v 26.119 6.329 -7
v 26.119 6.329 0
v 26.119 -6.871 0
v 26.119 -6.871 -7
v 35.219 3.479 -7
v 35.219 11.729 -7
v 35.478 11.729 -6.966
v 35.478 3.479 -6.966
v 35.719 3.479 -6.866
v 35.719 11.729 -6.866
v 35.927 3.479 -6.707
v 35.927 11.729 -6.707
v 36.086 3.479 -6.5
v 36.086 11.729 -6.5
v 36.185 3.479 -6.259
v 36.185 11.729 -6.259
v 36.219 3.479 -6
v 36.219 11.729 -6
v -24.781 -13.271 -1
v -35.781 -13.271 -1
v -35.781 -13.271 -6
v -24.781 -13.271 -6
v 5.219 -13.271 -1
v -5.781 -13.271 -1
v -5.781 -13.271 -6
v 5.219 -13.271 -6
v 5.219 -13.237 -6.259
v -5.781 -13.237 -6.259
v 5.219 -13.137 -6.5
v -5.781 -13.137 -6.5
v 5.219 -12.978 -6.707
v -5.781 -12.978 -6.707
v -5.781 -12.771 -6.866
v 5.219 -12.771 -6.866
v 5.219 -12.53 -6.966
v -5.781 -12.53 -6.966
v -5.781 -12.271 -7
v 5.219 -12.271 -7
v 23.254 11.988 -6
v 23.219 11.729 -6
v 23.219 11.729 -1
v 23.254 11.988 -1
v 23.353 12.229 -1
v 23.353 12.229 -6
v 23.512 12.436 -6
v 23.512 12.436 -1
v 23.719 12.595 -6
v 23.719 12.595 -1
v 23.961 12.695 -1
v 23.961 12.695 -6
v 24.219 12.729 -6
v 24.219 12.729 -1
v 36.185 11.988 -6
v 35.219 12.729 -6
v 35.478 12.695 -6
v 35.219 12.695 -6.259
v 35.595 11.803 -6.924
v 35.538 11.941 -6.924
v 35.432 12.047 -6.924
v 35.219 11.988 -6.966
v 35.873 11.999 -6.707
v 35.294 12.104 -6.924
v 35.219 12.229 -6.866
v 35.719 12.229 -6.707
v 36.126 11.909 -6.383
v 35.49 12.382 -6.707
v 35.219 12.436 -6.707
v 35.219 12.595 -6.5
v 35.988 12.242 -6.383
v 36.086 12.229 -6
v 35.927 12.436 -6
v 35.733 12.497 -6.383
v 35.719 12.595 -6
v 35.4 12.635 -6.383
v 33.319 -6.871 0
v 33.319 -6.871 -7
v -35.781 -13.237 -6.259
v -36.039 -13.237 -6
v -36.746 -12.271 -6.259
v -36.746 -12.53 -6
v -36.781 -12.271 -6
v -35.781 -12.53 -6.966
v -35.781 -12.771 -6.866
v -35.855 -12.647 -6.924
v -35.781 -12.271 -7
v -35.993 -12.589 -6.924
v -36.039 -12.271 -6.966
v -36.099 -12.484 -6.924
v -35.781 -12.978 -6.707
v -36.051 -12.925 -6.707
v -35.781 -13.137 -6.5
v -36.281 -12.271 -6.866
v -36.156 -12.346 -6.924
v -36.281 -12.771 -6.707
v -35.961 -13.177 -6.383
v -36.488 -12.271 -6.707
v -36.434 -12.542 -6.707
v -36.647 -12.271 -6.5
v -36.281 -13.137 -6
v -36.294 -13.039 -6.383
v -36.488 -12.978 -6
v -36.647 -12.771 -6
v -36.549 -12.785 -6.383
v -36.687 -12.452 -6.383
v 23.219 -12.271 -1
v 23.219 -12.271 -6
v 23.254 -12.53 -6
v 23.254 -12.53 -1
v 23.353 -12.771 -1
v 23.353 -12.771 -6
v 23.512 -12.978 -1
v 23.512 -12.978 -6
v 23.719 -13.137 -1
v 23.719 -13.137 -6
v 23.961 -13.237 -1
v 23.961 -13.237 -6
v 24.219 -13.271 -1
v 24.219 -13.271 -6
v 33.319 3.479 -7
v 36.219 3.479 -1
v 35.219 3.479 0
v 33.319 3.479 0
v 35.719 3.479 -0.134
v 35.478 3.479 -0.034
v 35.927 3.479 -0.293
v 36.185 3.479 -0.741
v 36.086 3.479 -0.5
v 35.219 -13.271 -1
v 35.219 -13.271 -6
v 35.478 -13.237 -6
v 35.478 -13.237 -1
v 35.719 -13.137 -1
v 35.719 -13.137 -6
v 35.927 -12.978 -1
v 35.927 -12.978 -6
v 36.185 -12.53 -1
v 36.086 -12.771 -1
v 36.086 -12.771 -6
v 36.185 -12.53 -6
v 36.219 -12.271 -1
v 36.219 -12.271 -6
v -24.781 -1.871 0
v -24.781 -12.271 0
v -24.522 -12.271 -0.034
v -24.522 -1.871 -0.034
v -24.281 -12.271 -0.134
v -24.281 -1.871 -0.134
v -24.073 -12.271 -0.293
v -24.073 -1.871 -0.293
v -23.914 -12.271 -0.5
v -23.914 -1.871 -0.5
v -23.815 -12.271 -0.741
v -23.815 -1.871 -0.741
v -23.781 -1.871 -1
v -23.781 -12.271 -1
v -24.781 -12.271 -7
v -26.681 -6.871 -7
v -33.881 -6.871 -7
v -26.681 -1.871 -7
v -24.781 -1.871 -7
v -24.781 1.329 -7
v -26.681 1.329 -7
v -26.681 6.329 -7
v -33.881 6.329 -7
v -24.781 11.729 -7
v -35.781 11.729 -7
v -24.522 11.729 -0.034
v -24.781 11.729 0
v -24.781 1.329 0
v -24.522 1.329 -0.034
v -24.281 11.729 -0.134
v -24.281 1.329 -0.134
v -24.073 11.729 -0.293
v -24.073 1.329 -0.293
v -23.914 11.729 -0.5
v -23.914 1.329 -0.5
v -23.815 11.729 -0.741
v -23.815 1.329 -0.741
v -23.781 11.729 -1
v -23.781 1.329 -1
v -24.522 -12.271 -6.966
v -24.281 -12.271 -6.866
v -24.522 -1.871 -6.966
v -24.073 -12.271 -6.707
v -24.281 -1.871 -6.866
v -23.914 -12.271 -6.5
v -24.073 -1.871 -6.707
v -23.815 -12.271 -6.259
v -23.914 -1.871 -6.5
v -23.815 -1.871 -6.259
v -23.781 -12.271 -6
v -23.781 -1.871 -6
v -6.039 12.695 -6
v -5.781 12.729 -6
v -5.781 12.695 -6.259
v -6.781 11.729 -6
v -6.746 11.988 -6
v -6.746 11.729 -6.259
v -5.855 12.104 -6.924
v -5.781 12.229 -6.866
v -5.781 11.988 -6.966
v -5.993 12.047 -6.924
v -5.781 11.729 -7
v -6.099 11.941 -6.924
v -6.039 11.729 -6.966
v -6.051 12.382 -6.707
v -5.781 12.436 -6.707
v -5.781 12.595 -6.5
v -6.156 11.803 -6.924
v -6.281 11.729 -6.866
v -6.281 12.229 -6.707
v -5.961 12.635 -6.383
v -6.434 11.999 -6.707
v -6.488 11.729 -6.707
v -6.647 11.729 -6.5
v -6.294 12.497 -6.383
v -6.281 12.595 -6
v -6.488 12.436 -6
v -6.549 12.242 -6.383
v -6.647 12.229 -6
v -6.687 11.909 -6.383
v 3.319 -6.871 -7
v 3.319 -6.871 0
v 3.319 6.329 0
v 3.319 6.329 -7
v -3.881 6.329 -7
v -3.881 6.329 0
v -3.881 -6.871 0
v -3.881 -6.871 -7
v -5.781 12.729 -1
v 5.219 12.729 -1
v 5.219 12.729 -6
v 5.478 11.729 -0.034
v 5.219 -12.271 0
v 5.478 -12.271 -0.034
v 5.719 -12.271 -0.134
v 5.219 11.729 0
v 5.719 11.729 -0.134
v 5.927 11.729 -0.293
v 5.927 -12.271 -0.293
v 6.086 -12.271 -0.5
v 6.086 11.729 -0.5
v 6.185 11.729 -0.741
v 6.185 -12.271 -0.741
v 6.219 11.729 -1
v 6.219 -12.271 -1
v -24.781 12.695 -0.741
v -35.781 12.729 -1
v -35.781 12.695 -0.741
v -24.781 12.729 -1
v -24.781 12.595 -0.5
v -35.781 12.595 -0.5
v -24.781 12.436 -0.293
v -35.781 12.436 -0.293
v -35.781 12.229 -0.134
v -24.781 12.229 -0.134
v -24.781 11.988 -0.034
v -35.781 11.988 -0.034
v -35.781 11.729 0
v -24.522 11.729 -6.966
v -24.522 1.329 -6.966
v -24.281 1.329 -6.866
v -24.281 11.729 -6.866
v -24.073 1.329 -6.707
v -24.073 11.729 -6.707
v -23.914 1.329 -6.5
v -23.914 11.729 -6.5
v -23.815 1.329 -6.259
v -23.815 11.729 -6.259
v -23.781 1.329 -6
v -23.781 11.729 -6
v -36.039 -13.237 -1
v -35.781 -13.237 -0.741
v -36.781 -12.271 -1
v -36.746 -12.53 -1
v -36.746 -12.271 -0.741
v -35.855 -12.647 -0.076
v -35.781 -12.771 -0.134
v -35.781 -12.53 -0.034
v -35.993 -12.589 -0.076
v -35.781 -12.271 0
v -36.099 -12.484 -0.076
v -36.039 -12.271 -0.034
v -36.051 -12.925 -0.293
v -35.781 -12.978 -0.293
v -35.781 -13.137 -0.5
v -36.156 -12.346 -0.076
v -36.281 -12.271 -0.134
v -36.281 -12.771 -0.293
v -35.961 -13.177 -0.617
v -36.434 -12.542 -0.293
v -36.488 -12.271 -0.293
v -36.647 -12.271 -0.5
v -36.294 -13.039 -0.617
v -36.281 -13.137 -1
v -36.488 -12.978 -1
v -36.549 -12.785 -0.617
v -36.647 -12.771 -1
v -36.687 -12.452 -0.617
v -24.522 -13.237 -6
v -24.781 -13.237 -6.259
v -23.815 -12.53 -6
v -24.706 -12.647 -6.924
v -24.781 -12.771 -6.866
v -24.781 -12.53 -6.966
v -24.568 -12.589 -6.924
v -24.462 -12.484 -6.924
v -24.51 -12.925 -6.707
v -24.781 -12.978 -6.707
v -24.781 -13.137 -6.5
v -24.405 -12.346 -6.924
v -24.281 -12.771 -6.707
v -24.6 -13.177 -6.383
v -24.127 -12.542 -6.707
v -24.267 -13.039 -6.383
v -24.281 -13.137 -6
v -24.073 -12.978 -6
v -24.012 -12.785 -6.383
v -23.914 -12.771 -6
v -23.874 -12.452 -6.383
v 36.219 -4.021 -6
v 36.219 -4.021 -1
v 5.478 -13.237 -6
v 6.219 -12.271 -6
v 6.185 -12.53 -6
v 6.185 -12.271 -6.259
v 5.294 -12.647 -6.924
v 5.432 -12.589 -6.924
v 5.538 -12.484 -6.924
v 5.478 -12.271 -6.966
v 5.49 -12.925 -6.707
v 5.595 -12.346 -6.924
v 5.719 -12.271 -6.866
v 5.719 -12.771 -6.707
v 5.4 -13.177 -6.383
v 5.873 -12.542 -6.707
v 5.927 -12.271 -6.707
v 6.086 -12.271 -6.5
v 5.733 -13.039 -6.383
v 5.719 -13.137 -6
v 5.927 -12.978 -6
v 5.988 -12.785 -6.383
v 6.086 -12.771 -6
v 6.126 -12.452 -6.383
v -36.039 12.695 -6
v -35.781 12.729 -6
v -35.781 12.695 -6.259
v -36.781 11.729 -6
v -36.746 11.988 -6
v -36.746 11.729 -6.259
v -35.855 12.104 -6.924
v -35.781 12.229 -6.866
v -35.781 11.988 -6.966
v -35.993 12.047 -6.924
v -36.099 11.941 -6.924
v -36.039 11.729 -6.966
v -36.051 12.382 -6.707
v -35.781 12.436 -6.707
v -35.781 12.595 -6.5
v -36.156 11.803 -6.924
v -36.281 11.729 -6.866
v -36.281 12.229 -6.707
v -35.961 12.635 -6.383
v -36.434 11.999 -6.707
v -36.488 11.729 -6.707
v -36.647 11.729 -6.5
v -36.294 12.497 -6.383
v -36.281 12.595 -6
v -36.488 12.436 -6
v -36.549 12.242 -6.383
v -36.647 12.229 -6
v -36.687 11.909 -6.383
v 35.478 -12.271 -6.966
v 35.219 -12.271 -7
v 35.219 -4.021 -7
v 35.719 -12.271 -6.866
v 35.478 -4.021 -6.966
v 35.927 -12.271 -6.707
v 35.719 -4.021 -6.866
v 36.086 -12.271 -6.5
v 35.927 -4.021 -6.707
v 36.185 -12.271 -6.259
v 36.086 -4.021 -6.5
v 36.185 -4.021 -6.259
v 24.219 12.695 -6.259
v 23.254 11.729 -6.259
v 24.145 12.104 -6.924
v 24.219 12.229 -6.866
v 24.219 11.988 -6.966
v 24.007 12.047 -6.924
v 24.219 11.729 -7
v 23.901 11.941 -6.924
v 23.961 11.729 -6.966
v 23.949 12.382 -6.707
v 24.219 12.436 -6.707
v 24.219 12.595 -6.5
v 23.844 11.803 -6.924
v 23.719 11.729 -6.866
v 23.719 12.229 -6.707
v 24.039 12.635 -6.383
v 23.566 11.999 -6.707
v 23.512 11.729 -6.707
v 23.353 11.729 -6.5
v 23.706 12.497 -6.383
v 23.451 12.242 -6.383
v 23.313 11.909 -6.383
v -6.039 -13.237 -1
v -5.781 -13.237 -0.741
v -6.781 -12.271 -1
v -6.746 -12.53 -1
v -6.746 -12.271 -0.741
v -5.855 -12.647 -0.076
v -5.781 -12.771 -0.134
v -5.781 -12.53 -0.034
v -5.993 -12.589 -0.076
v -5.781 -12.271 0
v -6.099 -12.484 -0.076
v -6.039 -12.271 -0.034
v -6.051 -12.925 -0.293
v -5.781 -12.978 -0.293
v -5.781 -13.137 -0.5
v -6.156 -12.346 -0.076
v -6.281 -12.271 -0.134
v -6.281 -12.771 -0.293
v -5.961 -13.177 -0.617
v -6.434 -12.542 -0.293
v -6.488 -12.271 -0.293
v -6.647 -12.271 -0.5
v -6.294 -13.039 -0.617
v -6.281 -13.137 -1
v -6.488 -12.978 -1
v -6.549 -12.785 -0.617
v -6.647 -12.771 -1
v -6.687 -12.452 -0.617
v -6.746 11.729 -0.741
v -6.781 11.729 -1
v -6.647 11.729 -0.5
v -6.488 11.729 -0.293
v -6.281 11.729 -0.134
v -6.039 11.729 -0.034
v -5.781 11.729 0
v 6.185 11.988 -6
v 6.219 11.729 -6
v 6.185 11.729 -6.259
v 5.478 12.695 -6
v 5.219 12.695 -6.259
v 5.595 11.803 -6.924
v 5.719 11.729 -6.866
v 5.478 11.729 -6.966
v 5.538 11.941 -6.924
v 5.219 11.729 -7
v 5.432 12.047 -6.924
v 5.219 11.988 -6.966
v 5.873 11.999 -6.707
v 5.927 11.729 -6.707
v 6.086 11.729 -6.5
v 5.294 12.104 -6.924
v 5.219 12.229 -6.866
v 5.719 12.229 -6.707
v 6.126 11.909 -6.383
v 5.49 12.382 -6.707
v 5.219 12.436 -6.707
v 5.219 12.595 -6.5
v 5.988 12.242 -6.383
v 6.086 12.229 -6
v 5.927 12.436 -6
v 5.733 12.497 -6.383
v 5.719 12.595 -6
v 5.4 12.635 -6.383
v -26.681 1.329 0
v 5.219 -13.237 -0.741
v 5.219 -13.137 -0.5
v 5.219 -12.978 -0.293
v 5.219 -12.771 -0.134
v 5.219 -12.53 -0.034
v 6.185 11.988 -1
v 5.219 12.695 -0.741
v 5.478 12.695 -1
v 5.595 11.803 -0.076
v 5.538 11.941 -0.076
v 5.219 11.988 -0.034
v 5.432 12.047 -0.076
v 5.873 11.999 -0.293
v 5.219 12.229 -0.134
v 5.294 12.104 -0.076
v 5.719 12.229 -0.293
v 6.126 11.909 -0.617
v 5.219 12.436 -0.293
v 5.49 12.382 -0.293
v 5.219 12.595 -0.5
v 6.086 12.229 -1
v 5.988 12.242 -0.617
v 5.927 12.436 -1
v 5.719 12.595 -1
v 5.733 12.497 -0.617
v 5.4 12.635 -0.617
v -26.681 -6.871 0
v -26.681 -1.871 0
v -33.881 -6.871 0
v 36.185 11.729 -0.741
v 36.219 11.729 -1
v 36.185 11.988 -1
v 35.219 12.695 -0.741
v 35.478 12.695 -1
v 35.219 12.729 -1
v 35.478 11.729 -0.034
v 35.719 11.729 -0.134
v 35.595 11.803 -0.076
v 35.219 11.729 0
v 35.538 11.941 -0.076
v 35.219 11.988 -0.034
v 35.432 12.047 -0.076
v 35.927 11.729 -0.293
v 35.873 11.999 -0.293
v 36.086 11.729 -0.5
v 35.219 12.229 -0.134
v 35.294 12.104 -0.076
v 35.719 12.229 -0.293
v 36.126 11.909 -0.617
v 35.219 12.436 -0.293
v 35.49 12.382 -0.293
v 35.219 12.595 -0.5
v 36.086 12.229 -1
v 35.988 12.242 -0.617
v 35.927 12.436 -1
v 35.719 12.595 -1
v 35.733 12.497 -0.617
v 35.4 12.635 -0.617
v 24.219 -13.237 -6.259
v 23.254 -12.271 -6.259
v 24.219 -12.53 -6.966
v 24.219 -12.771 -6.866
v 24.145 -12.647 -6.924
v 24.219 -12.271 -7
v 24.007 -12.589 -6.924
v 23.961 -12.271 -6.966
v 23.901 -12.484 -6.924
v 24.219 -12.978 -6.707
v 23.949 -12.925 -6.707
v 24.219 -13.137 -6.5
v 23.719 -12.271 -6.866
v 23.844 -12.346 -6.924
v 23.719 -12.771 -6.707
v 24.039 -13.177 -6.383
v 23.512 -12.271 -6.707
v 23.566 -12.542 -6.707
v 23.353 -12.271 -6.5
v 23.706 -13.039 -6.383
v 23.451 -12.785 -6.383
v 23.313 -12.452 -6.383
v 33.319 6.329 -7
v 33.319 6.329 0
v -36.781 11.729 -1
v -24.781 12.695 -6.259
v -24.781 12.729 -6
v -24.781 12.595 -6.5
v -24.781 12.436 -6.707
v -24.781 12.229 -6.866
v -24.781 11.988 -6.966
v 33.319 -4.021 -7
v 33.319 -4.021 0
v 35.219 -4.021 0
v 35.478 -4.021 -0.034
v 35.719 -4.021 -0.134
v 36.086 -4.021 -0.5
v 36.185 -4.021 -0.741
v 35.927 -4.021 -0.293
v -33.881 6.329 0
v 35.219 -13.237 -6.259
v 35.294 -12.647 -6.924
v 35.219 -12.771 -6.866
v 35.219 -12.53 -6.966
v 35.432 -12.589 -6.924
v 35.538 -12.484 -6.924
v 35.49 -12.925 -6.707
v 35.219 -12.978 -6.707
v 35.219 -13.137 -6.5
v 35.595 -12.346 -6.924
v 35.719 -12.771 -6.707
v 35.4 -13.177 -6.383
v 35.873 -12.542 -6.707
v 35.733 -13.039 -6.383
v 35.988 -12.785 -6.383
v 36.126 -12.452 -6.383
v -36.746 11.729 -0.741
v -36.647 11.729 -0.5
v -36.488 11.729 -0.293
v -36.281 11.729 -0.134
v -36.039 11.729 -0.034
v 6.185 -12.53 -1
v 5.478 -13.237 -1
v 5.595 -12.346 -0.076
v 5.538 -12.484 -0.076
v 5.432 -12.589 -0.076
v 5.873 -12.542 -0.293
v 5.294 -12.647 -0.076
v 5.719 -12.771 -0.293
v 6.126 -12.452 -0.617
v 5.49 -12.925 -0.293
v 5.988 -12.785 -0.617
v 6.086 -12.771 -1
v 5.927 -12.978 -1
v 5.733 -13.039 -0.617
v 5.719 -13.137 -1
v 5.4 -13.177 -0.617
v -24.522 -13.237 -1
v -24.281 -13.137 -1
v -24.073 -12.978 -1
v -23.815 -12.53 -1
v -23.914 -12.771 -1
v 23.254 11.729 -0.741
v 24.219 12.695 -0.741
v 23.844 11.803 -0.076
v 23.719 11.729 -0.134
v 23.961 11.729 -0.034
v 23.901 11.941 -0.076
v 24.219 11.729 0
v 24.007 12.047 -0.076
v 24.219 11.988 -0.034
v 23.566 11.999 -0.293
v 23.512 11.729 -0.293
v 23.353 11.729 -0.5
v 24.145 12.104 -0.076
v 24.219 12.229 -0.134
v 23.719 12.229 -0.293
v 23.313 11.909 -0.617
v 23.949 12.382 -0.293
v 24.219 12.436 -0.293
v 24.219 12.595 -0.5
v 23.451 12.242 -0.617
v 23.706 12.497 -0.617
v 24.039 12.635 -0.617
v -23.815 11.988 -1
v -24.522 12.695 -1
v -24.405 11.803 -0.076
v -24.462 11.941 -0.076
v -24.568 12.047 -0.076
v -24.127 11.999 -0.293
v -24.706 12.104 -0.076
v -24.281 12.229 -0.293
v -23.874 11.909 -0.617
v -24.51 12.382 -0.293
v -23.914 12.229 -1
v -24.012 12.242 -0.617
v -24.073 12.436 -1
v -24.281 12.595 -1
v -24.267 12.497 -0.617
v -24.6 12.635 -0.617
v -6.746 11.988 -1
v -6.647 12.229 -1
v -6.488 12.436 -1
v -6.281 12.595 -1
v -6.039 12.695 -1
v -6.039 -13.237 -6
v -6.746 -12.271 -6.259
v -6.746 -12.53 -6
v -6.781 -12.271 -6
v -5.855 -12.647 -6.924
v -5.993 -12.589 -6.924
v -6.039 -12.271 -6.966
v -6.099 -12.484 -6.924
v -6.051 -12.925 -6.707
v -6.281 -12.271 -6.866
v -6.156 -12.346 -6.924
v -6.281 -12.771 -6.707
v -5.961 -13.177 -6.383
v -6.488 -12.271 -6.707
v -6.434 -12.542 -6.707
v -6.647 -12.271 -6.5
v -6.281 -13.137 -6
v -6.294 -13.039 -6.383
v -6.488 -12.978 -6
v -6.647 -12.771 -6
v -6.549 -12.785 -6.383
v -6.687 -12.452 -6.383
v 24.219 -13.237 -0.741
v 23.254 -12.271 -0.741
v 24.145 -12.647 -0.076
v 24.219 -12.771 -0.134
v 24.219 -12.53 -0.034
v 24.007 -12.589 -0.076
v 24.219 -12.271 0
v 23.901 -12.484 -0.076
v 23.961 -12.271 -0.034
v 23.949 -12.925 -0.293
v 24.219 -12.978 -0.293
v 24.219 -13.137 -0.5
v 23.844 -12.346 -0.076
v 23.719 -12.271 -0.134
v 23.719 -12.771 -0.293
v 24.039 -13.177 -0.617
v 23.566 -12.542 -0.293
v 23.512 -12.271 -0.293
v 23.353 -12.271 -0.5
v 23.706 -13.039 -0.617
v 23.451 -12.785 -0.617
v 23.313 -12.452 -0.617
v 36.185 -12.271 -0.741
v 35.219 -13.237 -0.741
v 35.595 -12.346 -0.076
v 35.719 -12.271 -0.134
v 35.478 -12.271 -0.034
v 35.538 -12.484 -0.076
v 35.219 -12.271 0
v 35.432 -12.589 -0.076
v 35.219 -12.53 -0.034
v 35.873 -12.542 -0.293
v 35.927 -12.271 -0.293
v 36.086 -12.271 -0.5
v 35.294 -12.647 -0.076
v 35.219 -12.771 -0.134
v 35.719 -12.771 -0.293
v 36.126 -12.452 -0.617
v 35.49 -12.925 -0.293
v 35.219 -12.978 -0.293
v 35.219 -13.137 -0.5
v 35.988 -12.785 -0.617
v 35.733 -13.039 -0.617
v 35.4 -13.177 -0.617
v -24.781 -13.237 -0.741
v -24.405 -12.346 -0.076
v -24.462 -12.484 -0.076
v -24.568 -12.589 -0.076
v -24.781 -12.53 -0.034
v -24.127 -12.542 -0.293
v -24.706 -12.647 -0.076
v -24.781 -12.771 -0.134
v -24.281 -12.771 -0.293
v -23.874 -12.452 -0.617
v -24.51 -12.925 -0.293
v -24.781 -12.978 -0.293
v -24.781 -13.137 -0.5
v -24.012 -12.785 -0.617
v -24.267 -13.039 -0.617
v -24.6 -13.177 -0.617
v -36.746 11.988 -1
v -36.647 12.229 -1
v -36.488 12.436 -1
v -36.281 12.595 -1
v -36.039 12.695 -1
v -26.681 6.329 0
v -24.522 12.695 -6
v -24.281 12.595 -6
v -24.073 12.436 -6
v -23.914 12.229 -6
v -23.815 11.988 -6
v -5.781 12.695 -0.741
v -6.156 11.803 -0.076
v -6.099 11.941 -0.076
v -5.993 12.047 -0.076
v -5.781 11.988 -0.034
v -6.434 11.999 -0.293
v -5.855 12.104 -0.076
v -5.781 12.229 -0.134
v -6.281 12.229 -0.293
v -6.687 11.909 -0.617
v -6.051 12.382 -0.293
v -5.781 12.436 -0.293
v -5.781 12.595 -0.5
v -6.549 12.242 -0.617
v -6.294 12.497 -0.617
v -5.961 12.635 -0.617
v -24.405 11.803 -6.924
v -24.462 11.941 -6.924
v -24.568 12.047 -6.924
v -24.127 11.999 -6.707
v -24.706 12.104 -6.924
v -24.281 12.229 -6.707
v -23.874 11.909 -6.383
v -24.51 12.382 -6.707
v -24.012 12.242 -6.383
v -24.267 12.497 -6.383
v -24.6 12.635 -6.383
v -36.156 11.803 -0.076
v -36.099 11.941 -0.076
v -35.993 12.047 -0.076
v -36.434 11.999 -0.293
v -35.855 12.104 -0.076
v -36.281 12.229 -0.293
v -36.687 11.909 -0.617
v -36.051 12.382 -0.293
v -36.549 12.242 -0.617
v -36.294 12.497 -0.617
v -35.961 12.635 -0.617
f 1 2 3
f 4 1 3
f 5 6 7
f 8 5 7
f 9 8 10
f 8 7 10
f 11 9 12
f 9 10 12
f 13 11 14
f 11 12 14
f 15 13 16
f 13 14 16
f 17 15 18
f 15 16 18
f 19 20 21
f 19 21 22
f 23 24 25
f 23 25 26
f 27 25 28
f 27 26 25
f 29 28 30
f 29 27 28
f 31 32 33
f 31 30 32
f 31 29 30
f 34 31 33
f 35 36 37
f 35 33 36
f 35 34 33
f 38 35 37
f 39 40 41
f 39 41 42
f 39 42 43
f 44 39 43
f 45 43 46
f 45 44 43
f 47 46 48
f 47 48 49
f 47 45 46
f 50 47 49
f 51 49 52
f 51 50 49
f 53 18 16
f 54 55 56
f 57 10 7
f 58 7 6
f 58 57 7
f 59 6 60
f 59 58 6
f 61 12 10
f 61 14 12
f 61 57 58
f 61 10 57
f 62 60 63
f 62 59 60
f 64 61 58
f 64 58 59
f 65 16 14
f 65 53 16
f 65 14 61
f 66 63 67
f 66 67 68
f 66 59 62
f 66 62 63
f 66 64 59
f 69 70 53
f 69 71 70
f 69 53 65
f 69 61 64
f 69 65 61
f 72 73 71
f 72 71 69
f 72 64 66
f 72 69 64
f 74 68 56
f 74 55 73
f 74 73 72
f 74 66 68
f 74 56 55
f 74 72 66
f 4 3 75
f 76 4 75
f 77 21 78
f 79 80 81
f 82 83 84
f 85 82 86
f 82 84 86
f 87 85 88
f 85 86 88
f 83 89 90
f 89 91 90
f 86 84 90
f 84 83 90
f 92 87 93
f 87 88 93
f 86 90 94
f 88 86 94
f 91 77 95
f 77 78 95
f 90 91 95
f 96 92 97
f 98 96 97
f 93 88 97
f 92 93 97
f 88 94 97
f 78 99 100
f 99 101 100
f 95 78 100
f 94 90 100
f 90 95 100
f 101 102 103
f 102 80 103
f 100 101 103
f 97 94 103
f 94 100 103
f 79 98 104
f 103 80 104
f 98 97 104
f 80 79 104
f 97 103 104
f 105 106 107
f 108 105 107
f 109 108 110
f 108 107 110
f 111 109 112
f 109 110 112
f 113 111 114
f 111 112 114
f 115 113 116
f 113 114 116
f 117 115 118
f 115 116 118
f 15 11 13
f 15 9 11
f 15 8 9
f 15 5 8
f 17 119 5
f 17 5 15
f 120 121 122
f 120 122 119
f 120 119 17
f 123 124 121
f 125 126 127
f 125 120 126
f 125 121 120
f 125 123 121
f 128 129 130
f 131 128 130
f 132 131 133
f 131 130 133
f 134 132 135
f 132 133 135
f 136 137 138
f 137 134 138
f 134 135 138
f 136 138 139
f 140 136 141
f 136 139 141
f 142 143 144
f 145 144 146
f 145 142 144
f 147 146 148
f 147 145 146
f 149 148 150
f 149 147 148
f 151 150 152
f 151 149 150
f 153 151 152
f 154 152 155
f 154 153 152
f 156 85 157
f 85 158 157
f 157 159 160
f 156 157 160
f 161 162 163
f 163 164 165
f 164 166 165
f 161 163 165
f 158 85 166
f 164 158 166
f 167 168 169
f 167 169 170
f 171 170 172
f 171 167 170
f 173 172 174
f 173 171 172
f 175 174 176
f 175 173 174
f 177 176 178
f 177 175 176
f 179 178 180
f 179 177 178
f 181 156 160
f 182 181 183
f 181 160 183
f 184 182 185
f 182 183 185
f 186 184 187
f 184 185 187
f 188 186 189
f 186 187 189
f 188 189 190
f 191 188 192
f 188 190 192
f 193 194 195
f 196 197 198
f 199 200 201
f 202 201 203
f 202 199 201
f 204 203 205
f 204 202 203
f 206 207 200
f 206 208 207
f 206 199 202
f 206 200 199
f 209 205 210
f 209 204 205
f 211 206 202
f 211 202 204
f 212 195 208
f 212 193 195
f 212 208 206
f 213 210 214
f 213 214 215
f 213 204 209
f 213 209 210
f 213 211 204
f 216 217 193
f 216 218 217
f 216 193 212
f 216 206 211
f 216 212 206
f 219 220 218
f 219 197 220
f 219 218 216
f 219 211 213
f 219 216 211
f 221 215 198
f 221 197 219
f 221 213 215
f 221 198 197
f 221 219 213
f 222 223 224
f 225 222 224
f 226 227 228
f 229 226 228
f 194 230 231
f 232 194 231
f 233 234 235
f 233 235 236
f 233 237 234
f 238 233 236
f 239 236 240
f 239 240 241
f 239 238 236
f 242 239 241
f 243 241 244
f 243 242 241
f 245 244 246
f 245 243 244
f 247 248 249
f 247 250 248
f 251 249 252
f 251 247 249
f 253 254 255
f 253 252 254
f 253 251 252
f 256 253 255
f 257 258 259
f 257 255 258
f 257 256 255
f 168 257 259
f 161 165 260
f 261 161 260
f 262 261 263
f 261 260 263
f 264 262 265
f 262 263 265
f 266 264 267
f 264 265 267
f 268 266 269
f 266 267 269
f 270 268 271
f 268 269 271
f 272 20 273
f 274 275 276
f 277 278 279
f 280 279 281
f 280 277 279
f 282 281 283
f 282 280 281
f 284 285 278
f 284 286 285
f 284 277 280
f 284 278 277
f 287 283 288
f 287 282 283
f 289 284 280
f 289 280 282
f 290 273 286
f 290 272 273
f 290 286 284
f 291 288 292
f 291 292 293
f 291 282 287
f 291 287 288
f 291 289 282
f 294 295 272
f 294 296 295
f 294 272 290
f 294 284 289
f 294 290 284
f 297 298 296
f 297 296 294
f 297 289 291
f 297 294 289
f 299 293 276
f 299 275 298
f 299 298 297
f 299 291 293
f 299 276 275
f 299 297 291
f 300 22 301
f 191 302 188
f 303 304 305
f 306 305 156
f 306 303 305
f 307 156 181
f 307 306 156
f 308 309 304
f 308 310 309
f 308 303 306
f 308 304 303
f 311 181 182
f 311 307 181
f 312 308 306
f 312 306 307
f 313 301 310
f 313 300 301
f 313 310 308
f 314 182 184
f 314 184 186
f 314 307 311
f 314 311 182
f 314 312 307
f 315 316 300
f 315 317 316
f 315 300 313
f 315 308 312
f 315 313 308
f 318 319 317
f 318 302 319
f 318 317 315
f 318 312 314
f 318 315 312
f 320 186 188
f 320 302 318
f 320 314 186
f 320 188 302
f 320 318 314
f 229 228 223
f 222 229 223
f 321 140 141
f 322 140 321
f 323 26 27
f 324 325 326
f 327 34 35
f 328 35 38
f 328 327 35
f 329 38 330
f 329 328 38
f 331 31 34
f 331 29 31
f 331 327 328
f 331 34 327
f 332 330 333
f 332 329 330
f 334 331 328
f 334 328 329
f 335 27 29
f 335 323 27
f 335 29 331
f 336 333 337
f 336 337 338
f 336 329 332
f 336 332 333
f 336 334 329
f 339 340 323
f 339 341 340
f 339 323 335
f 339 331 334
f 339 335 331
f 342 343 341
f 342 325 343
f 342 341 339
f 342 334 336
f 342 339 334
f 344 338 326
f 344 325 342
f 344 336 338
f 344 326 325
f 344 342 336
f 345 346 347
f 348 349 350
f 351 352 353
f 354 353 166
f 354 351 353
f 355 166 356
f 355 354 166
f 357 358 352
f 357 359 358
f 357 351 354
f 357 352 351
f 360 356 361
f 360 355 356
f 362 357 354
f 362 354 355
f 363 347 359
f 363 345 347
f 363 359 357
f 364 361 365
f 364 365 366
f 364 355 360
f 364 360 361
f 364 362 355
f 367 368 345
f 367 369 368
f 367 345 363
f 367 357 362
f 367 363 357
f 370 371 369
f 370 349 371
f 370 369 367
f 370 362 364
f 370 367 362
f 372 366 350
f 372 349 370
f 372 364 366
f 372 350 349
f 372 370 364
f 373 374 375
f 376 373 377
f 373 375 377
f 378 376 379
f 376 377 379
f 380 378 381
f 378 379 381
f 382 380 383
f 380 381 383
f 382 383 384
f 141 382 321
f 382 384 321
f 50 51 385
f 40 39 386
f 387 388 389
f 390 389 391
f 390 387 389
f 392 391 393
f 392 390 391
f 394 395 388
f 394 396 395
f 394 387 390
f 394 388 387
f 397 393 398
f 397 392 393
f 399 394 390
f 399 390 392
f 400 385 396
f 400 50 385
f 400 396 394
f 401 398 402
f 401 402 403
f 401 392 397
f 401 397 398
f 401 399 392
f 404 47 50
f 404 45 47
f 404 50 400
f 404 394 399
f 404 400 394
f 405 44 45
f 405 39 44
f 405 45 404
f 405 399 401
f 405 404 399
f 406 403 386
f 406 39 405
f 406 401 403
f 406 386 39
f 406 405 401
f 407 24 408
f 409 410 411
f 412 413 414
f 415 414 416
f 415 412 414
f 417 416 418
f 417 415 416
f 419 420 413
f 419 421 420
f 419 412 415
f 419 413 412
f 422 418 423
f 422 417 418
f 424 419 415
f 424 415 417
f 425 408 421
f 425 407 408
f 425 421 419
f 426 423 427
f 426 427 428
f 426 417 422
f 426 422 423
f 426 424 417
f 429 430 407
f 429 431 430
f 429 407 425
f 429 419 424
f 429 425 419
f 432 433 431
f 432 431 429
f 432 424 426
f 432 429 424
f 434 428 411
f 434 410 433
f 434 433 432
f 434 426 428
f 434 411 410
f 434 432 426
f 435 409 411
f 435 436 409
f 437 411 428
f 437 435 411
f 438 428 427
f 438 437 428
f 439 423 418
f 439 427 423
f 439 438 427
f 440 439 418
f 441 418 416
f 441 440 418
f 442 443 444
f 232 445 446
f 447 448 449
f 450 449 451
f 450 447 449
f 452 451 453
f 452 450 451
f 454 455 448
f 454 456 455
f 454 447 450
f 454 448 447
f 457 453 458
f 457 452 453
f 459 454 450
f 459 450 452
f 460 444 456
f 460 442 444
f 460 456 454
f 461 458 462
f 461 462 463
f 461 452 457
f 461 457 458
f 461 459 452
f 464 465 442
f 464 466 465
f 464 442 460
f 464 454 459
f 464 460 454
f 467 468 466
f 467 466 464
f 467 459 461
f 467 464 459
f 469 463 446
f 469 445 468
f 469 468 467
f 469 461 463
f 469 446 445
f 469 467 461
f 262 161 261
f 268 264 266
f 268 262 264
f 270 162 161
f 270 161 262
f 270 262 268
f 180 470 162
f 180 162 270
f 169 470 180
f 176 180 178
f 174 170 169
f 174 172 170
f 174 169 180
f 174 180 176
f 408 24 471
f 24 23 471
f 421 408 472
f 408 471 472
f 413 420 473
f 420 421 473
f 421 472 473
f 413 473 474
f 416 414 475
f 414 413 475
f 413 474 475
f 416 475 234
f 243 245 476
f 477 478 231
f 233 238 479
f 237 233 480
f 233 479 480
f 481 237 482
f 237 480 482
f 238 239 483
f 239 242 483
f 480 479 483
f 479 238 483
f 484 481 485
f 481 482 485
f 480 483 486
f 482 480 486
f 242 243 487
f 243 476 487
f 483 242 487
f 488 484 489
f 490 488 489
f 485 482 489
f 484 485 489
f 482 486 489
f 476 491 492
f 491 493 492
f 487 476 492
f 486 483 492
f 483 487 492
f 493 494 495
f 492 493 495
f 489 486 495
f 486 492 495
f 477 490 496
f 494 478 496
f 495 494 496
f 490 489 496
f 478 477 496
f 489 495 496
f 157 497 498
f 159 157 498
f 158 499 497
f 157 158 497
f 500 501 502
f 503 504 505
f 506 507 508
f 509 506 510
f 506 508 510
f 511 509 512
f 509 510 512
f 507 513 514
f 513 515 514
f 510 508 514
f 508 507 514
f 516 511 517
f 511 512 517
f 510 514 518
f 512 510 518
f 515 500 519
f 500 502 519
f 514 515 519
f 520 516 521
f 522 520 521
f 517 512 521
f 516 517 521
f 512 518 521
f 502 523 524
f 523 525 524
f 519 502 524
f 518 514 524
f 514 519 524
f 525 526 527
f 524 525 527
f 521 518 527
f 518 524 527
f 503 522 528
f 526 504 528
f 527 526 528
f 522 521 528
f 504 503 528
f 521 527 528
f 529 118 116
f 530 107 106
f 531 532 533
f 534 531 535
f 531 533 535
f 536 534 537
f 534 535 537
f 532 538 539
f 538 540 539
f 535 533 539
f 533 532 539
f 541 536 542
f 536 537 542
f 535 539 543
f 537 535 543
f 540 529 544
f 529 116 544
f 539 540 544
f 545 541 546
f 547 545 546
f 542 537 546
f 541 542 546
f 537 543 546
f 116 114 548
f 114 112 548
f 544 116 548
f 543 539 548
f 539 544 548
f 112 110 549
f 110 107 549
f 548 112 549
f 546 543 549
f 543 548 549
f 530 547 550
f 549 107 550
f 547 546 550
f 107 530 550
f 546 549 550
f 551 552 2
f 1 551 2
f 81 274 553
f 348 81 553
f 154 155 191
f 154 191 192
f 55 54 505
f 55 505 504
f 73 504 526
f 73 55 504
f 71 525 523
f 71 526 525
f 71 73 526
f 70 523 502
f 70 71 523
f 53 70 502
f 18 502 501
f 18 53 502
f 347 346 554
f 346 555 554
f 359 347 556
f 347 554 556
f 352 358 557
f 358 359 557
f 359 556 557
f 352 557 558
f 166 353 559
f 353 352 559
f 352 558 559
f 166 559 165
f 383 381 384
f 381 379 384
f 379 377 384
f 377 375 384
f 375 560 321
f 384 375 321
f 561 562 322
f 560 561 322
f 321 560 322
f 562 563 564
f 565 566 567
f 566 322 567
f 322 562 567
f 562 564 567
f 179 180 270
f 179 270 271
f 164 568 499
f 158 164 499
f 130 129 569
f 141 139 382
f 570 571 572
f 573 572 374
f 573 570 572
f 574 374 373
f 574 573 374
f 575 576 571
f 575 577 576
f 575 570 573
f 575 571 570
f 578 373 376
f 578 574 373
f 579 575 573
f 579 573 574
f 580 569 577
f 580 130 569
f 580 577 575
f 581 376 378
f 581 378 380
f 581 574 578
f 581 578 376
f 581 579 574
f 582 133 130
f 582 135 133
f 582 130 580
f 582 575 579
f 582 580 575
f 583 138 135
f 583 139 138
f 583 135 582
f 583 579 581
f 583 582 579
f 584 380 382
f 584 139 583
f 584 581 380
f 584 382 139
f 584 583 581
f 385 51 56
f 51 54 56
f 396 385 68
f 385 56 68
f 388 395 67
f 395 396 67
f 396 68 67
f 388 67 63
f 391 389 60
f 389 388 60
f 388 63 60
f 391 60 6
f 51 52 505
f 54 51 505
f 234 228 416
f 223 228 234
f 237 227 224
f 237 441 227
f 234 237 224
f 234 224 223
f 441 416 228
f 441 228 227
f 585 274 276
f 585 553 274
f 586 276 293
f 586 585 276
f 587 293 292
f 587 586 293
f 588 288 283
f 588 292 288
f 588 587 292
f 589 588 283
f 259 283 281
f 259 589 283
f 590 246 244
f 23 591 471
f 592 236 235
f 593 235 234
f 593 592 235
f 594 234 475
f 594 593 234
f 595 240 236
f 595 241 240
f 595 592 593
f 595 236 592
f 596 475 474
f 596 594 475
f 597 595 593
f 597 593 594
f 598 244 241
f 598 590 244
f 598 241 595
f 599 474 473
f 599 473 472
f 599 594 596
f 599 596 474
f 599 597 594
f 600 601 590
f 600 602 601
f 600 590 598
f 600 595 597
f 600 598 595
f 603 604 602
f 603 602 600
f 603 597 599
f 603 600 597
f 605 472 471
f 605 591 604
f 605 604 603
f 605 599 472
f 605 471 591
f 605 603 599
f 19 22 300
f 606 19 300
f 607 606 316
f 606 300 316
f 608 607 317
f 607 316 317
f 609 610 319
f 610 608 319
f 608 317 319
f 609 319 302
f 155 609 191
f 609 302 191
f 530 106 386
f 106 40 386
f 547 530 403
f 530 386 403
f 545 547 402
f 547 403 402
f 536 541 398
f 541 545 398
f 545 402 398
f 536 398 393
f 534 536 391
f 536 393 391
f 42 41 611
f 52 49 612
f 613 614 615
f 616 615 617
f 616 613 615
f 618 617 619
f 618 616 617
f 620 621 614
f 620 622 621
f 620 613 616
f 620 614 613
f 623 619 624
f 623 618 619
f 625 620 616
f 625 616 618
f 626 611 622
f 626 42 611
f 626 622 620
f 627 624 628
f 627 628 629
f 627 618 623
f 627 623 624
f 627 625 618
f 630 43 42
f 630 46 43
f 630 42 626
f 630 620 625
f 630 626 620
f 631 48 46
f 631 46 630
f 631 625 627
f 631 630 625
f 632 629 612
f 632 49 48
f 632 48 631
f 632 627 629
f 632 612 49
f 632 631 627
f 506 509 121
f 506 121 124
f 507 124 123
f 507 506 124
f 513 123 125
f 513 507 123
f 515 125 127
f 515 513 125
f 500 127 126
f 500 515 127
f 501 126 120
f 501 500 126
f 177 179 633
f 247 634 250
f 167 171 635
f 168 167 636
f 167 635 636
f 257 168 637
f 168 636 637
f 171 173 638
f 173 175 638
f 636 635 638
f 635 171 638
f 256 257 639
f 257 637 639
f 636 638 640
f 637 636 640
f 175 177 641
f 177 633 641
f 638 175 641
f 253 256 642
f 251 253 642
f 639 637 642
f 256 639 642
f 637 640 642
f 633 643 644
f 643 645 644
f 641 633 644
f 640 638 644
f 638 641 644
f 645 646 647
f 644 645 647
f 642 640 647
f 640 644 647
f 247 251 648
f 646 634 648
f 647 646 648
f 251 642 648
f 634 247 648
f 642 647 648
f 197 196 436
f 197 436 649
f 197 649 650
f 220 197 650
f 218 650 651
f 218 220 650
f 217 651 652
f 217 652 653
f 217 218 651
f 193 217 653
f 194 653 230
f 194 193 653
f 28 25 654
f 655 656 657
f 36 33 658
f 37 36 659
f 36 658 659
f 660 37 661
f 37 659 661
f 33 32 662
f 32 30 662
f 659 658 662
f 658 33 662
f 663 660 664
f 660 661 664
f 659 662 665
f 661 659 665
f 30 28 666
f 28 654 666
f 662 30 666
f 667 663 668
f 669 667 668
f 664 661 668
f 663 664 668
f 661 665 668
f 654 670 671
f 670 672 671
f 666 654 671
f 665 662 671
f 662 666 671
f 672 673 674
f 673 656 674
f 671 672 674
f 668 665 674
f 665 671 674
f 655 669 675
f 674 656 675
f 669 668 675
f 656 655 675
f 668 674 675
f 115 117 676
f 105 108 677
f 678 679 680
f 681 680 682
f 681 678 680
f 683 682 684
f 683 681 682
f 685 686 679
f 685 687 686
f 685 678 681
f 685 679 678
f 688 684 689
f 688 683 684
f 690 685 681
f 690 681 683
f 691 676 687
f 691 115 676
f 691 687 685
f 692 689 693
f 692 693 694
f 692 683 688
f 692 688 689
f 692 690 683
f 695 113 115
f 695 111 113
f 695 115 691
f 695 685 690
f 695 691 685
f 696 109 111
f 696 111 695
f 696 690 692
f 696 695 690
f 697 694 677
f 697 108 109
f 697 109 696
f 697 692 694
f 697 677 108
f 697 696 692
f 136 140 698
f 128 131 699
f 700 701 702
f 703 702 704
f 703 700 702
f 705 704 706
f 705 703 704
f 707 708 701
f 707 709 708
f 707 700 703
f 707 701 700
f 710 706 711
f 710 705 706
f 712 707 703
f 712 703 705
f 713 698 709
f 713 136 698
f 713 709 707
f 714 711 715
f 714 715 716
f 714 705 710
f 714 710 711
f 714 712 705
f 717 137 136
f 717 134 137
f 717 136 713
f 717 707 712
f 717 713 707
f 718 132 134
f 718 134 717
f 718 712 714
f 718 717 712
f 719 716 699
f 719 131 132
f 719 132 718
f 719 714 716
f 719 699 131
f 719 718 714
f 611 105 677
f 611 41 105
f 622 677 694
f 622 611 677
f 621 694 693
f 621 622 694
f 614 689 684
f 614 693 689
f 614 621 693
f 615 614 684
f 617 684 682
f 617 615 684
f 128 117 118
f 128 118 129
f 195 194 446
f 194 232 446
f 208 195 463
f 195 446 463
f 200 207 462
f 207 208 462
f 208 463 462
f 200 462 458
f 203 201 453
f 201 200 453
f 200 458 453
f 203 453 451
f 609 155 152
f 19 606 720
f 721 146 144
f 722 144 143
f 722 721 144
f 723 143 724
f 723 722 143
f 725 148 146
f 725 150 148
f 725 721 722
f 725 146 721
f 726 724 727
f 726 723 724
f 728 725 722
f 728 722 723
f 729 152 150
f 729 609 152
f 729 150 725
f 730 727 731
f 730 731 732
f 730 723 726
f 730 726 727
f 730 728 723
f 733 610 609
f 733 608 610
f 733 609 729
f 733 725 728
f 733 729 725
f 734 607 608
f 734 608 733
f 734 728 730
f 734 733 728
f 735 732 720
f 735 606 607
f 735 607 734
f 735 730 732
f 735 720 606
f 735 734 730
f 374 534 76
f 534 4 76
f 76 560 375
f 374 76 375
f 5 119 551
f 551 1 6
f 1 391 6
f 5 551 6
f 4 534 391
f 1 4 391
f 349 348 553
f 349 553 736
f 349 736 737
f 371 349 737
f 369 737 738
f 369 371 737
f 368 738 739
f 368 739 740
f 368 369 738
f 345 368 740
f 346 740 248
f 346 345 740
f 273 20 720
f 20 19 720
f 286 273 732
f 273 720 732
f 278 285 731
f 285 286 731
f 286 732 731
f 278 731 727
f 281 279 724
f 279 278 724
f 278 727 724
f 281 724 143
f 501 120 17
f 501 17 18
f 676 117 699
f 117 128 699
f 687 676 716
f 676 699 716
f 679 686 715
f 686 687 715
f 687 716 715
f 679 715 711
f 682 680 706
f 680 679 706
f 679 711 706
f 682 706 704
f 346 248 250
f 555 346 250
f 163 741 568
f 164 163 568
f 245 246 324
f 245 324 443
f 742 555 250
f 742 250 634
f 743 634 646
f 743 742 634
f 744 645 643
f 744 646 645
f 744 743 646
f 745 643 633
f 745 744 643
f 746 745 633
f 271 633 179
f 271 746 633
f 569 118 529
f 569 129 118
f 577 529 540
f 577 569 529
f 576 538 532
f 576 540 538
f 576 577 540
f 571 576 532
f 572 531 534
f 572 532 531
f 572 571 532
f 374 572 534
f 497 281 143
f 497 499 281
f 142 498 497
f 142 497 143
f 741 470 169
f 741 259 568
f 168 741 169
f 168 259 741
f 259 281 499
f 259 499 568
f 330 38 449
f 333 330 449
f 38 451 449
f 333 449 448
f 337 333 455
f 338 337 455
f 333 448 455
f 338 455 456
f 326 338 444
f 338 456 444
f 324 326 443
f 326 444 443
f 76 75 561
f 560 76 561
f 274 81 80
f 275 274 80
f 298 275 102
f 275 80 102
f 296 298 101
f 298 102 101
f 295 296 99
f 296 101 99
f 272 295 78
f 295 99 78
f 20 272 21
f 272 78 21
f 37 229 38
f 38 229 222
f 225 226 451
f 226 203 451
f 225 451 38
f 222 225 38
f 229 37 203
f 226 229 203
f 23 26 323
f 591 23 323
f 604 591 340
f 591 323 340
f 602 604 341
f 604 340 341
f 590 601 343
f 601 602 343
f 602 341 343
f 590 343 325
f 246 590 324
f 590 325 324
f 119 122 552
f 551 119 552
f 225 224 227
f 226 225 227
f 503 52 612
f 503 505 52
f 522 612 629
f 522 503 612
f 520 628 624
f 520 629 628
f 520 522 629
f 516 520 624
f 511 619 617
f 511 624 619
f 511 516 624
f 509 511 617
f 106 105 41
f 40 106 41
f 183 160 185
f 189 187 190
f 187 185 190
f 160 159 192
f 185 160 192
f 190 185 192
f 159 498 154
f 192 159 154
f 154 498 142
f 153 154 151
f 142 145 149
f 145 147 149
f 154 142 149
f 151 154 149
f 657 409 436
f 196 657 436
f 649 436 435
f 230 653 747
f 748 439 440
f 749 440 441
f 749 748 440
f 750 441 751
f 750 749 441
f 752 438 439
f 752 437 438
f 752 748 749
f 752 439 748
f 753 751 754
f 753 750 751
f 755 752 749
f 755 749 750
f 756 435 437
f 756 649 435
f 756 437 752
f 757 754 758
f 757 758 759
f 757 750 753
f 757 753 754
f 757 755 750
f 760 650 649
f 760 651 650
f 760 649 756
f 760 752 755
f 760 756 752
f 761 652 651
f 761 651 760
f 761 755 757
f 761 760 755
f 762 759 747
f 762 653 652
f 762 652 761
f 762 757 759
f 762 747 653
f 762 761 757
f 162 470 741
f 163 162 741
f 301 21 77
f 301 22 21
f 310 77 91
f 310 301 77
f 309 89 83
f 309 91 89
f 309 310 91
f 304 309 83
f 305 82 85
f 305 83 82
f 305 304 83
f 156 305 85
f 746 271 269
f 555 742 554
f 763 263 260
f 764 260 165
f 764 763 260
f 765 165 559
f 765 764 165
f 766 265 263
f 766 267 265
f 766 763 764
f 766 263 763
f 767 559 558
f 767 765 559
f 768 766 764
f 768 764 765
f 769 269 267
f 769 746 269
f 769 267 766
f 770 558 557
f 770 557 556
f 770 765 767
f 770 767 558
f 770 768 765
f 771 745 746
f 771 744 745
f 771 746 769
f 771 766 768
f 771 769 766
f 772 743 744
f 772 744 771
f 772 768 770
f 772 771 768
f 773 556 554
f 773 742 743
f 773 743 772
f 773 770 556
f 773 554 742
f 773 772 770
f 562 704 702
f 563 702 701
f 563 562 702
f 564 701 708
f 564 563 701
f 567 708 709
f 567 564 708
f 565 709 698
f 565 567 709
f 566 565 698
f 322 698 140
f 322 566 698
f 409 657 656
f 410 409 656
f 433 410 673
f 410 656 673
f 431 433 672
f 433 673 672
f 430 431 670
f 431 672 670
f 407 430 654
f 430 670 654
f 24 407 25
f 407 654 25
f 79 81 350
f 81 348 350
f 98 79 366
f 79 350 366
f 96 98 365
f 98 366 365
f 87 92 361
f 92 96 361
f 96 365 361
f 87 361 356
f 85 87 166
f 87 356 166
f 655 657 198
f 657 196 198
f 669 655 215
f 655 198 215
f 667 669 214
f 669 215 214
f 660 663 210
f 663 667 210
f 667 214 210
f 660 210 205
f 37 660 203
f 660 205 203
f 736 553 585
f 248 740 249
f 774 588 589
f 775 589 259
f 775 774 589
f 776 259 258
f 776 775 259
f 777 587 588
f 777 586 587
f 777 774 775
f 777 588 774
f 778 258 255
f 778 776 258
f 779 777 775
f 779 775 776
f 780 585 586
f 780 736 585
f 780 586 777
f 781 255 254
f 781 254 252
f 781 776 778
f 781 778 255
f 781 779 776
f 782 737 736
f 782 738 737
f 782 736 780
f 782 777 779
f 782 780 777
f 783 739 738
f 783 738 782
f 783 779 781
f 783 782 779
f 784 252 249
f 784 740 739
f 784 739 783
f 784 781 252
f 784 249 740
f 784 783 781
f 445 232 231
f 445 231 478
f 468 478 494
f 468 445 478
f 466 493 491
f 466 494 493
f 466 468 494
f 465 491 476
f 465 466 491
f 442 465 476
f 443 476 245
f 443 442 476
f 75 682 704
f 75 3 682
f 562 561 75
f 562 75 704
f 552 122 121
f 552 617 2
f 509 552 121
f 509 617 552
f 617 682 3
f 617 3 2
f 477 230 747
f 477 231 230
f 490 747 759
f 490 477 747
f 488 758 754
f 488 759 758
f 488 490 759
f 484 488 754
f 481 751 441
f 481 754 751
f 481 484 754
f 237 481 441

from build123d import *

# Parameters (mm, degrees)
F0_W      = 13
F0_H      = 26
F1_DEPTH  = 7
F3_DEPTH  = 7.001
F4_R      = 1
F6_W      = 10
F6_H      = 7.5
F7_DEPTH  = 7.001
F9_W      = 10
F9_H      = 3.2
F10_DEPTH = 7.001


with BuildPart() as f1:
    # F0 (on Top) → F1 (new body)
    with BuildSketch(Plane.XY):
        with Locations((-0.280514, -0.271288)):
            Rectangle(F0_W, F0_H)
    extrude(amount=-F1_DEPTH)

    # F2 (on face) → F3 (cut, through all)
    with BuildSketch(Plane.XY):
        Polygon((-0.280514, 6.328712), (-3.880514, 6.328712), (-3.880514, -0.271288), (-3.880514, -6.871288), (-0.280514, -6.871288), (3.319486, -6.871288), (3.319486, -0.271288), (3.319486, 6.328712), align=None)
    extrude(amount=-F3_DEPTH, mode=Mode.SUBTRACT)

    # F4
    f4_edges = [f1.edges().sort_by_distance(p)[0] for p in [
        (6.219486, -13.271288, -3.5),
        (6.219486, 12.728712, -3.5),
        (-6.780514, -13.271288, -3.5),
        (-6.780514, 12.728712, -3.5),
        (6.219486, -0.271288, 0),
        (-0.280514, -13.271288, 0),
        (-6.780514, -0.271288, 0),
        (-0.280514, 12.728712, 0),
        (-0.280514, -13.271288, -7),
        (6.219486, -0.271288, -7),
        (-0.280514, 12.728712, -7),
        (-6.780514, -0.271288, -7),
    ]]
    fillet(f4_edges, radius=F4_R)


with BuildPart() as f5_1:
    # F5: copy of F1
    add(f1.part.moved(Location((30, 0, 0))))

    # F6 (on face) → F7 (cut, through all)
    with BuildSketch(Plane.XY):
        with Locations((35.119486, -0.271288)):
            Rectangle(F6_W, F6_H)
    extrude(amount=-F7_DEPTH, mode=Mode.SUBTRACT)


with BuildPart() as f8_1:
    # F8: copy of F1
    add(f1.part.moved(Location((-30, 0, 0))))

    # F9 (on face) → F10 (cut, through all)
    with BuildSketch(Plane.XY):
        with Locations((-24.880514, -0.271288)):
            Rectangle(F9_W, F9_H)
    extrude(amount=-F10_DEPTH, mode=Mode.SUBTRACT)


solid = Compound([f1.part, f5_1.part, f8_1.part])
